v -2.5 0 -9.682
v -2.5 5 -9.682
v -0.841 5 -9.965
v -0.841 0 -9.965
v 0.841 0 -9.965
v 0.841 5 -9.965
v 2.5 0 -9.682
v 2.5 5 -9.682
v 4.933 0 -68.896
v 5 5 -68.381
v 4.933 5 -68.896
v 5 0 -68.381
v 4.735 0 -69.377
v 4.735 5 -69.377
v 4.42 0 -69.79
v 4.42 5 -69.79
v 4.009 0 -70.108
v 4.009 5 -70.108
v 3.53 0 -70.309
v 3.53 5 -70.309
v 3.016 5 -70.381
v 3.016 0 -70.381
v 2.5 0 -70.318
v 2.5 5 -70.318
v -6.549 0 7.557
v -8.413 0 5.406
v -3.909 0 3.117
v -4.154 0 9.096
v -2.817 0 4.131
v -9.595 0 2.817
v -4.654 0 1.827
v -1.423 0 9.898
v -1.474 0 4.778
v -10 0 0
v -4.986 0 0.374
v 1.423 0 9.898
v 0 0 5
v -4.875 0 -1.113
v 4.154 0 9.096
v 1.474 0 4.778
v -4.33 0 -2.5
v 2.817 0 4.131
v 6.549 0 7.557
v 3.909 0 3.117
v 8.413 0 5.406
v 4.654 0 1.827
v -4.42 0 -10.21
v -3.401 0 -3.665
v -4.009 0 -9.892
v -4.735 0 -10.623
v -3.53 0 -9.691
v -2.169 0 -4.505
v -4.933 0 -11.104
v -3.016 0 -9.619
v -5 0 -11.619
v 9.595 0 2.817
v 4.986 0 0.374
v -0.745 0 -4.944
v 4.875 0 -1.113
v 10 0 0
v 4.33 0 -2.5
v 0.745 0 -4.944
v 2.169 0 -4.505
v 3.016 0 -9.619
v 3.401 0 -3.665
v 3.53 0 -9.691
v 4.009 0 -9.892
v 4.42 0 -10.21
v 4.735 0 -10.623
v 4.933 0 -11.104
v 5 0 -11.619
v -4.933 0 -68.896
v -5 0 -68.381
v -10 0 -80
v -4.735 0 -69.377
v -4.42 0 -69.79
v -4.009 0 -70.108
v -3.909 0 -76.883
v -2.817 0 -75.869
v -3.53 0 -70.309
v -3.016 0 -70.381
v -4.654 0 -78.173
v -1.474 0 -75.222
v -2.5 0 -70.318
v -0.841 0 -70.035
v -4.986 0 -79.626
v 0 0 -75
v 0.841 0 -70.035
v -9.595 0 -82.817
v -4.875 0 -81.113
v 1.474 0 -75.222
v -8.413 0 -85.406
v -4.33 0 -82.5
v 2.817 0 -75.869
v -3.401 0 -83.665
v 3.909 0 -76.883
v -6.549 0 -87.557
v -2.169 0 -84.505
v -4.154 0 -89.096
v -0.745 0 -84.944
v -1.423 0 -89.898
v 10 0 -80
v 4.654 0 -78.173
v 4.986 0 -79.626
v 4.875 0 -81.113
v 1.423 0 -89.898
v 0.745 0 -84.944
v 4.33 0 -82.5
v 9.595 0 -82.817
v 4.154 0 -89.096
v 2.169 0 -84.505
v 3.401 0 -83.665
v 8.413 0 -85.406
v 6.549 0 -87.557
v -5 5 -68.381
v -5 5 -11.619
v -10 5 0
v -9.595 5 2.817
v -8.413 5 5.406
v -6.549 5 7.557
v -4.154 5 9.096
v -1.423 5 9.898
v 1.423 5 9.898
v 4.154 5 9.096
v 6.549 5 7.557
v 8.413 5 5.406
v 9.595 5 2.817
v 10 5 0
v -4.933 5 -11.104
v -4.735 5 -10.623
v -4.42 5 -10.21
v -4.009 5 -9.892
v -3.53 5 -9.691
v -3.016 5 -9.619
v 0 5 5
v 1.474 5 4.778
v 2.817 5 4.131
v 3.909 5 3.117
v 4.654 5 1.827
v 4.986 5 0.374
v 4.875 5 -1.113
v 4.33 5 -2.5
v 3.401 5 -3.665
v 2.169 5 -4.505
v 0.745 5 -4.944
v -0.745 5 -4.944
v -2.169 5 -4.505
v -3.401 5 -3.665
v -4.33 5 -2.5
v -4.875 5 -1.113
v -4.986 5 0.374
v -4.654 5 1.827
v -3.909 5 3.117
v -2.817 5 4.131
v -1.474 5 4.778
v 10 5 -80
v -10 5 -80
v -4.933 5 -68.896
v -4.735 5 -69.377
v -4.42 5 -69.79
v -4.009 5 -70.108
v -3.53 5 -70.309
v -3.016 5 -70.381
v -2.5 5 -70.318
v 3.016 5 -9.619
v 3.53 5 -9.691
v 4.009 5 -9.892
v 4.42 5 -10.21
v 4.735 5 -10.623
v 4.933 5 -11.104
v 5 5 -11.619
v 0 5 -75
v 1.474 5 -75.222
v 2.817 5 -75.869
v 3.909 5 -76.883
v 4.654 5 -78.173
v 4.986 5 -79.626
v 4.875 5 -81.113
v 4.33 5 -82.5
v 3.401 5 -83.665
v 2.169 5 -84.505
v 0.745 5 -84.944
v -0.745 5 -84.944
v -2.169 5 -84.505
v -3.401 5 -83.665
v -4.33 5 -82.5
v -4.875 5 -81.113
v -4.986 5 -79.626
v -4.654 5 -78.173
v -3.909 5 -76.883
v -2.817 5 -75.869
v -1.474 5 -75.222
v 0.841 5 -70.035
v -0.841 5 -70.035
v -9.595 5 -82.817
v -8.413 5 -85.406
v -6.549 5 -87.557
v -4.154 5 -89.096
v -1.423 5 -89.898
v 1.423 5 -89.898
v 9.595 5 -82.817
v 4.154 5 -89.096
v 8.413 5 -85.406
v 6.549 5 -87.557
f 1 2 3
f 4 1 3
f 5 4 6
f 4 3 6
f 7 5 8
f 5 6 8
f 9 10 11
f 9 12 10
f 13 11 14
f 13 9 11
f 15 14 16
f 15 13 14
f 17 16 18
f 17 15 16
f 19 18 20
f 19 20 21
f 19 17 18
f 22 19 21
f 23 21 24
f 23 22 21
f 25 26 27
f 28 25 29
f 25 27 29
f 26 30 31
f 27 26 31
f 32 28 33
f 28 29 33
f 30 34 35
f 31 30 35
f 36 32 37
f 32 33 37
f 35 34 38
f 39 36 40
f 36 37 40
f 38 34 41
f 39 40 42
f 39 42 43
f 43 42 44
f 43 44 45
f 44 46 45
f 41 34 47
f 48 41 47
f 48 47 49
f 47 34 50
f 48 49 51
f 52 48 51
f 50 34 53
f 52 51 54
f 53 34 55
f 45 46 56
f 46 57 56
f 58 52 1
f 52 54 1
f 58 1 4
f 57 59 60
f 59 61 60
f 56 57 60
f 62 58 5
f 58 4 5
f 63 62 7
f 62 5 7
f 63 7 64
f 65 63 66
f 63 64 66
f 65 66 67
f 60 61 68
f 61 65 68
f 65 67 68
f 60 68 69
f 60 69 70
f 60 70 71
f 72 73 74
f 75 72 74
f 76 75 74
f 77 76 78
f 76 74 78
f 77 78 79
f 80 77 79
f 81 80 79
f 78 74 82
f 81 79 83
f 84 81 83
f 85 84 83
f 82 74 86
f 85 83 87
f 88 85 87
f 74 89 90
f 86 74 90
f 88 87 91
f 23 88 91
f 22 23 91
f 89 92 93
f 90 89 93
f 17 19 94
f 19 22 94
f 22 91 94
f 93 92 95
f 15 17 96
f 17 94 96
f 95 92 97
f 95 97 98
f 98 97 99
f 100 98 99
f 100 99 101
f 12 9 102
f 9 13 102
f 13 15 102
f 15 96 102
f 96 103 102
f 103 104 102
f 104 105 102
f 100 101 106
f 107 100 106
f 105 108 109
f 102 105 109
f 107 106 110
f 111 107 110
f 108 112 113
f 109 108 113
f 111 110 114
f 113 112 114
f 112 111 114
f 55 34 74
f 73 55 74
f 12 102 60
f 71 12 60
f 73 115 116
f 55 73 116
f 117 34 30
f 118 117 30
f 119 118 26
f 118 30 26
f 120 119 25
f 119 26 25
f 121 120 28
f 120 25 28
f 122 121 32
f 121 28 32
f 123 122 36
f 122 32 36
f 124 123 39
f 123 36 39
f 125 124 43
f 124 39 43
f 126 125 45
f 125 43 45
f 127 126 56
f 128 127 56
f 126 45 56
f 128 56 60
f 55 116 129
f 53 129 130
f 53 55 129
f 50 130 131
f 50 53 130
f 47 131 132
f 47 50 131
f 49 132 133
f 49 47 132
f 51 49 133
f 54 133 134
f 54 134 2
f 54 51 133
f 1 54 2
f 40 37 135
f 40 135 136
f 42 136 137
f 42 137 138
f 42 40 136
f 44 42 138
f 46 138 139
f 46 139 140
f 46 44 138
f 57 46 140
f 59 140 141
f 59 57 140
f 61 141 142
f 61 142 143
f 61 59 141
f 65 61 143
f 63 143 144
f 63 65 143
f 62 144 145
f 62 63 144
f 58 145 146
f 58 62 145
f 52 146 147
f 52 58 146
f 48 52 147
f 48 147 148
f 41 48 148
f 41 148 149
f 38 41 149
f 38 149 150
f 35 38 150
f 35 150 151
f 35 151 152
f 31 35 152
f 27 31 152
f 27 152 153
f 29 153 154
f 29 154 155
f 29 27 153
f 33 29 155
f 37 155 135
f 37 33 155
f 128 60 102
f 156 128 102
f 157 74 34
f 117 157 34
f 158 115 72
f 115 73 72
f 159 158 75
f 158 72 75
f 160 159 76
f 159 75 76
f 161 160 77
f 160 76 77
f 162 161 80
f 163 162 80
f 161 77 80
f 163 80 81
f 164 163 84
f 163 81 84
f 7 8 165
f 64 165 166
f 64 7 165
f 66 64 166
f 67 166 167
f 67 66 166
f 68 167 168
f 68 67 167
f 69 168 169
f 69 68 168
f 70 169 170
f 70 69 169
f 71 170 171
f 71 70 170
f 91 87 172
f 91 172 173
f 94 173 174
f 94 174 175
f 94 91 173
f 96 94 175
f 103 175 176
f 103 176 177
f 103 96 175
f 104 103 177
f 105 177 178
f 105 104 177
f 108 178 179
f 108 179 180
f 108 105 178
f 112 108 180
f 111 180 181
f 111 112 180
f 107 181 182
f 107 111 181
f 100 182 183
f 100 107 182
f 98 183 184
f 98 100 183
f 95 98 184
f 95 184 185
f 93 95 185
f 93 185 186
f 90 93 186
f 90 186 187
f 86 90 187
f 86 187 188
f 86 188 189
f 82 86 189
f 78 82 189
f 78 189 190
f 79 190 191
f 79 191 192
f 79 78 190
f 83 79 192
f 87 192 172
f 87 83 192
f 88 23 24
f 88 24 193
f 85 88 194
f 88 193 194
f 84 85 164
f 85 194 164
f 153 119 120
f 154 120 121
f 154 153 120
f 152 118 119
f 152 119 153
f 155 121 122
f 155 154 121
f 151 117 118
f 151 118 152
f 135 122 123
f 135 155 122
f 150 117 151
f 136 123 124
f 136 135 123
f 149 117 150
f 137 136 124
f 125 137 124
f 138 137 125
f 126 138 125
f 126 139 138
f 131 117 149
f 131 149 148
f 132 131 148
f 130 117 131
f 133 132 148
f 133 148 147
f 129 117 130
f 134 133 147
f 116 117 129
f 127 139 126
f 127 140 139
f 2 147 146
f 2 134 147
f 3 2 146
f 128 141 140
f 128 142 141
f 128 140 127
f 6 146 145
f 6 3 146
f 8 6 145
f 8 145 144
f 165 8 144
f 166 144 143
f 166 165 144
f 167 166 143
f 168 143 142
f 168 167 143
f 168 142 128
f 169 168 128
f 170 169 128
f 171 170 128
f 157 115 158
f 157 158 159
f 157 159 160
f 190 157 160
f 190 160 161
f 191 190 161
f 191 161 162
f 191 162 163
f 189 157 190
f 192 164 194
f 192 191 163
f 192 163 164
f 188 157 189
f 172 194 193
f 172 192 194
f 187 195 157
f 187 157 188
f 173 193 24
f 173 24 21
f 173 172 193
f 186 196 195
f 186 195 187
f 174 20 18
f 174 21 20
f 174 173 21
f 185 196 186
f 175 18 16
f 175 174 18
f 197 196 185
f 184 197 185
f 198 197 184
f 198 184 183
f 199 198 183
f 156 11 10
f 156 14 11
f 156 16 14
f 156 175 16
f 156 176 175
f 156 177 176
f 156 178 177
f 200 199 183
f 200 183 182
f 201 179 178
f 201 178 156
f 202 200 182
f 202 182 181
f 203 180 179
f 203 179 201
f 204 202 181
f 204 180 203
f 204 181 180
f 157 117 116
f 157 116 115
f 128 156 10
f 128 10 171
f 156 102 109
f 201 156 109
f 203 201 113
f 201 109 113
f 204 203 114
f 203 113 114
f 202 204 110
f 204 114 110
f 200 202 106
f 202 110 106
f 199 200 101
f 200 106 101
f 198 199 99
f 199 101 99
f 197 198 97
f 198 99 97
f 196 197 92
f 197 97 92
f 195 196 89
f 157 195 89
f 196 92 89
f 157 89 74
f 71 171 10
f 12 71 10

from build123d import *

# Parameters (mm, degrees)
SKETCH_1_R          = 5
EXTRUDE_1_DEPTH     = 5
CUT_EXTRUDE_1_DEPTH = 91.691785736
FILLET_1_R          = 2


with BuildPart() as part:
    # 草图1 → 凸台-拉伸1 (new body)
    with BuildSketch(Plane(origin=(0, 0, 0), x_dir=(1, 0, 0), z_dir=(0, 1, 0))):
        with BuildLine():
            Line((-10, 80), (-10, 0))
            ThreePointArc((-10, 0), (0, -10), (10, 0))
            Line((10, 0), (10, 80))
            ThreePointArc((10, 80), (0, 90), (-10, 80))
        make_face()
        with Locations(Location((0, 0, 0), (0, 0, 270))):
            Circle(SKETCH_1_R, mode=Mode.SUBTRACT)
        with Locations(Location((0, 80, 0), (0, 0, 270))):
            Circle(SKETCH_1_R, mode=Mode.SUBTRACT)
    extrude(amount=EXTRUDE_1_DEPTH)

    # 草图2 → 切除-拉伸1 (cut, through all)
    with BuildSketch(Plane(origin=(0, 5, 0), x_dir=(1, 0, 0), z_dir=(0, 1, 0))):
        with BuildLine():
            ThreePointArc((5, 71.339745962), (0, 70), (-5, 71.339745962))
            Line((-5, 71.339745962), (-5, 8.660254038))
            ThreePointArc((-5, 8.660254038), (0, 10), (5, 8.660254038))
            Line((5, 8.660254038), (5, 71.339745962))
        make_face()
    extrude(amount=-CUT_EXTRUDE_1_DEPTH, mode=Mode.SUBTRACT)

    # 圆角1
    fillet_1_edges = [part.edges().sort_by_distance(p)[0] for p in [
        (-5, 2.5, -71.339745962),
        (5, 2.5, -71.339745962),
        (5, 2.5, -8.660254038),
        (-5, 2.5, -8.660254038),
    ]]
    fillet(fillet_1_edges, radius=FILLET_1_R)


solid = part.part
